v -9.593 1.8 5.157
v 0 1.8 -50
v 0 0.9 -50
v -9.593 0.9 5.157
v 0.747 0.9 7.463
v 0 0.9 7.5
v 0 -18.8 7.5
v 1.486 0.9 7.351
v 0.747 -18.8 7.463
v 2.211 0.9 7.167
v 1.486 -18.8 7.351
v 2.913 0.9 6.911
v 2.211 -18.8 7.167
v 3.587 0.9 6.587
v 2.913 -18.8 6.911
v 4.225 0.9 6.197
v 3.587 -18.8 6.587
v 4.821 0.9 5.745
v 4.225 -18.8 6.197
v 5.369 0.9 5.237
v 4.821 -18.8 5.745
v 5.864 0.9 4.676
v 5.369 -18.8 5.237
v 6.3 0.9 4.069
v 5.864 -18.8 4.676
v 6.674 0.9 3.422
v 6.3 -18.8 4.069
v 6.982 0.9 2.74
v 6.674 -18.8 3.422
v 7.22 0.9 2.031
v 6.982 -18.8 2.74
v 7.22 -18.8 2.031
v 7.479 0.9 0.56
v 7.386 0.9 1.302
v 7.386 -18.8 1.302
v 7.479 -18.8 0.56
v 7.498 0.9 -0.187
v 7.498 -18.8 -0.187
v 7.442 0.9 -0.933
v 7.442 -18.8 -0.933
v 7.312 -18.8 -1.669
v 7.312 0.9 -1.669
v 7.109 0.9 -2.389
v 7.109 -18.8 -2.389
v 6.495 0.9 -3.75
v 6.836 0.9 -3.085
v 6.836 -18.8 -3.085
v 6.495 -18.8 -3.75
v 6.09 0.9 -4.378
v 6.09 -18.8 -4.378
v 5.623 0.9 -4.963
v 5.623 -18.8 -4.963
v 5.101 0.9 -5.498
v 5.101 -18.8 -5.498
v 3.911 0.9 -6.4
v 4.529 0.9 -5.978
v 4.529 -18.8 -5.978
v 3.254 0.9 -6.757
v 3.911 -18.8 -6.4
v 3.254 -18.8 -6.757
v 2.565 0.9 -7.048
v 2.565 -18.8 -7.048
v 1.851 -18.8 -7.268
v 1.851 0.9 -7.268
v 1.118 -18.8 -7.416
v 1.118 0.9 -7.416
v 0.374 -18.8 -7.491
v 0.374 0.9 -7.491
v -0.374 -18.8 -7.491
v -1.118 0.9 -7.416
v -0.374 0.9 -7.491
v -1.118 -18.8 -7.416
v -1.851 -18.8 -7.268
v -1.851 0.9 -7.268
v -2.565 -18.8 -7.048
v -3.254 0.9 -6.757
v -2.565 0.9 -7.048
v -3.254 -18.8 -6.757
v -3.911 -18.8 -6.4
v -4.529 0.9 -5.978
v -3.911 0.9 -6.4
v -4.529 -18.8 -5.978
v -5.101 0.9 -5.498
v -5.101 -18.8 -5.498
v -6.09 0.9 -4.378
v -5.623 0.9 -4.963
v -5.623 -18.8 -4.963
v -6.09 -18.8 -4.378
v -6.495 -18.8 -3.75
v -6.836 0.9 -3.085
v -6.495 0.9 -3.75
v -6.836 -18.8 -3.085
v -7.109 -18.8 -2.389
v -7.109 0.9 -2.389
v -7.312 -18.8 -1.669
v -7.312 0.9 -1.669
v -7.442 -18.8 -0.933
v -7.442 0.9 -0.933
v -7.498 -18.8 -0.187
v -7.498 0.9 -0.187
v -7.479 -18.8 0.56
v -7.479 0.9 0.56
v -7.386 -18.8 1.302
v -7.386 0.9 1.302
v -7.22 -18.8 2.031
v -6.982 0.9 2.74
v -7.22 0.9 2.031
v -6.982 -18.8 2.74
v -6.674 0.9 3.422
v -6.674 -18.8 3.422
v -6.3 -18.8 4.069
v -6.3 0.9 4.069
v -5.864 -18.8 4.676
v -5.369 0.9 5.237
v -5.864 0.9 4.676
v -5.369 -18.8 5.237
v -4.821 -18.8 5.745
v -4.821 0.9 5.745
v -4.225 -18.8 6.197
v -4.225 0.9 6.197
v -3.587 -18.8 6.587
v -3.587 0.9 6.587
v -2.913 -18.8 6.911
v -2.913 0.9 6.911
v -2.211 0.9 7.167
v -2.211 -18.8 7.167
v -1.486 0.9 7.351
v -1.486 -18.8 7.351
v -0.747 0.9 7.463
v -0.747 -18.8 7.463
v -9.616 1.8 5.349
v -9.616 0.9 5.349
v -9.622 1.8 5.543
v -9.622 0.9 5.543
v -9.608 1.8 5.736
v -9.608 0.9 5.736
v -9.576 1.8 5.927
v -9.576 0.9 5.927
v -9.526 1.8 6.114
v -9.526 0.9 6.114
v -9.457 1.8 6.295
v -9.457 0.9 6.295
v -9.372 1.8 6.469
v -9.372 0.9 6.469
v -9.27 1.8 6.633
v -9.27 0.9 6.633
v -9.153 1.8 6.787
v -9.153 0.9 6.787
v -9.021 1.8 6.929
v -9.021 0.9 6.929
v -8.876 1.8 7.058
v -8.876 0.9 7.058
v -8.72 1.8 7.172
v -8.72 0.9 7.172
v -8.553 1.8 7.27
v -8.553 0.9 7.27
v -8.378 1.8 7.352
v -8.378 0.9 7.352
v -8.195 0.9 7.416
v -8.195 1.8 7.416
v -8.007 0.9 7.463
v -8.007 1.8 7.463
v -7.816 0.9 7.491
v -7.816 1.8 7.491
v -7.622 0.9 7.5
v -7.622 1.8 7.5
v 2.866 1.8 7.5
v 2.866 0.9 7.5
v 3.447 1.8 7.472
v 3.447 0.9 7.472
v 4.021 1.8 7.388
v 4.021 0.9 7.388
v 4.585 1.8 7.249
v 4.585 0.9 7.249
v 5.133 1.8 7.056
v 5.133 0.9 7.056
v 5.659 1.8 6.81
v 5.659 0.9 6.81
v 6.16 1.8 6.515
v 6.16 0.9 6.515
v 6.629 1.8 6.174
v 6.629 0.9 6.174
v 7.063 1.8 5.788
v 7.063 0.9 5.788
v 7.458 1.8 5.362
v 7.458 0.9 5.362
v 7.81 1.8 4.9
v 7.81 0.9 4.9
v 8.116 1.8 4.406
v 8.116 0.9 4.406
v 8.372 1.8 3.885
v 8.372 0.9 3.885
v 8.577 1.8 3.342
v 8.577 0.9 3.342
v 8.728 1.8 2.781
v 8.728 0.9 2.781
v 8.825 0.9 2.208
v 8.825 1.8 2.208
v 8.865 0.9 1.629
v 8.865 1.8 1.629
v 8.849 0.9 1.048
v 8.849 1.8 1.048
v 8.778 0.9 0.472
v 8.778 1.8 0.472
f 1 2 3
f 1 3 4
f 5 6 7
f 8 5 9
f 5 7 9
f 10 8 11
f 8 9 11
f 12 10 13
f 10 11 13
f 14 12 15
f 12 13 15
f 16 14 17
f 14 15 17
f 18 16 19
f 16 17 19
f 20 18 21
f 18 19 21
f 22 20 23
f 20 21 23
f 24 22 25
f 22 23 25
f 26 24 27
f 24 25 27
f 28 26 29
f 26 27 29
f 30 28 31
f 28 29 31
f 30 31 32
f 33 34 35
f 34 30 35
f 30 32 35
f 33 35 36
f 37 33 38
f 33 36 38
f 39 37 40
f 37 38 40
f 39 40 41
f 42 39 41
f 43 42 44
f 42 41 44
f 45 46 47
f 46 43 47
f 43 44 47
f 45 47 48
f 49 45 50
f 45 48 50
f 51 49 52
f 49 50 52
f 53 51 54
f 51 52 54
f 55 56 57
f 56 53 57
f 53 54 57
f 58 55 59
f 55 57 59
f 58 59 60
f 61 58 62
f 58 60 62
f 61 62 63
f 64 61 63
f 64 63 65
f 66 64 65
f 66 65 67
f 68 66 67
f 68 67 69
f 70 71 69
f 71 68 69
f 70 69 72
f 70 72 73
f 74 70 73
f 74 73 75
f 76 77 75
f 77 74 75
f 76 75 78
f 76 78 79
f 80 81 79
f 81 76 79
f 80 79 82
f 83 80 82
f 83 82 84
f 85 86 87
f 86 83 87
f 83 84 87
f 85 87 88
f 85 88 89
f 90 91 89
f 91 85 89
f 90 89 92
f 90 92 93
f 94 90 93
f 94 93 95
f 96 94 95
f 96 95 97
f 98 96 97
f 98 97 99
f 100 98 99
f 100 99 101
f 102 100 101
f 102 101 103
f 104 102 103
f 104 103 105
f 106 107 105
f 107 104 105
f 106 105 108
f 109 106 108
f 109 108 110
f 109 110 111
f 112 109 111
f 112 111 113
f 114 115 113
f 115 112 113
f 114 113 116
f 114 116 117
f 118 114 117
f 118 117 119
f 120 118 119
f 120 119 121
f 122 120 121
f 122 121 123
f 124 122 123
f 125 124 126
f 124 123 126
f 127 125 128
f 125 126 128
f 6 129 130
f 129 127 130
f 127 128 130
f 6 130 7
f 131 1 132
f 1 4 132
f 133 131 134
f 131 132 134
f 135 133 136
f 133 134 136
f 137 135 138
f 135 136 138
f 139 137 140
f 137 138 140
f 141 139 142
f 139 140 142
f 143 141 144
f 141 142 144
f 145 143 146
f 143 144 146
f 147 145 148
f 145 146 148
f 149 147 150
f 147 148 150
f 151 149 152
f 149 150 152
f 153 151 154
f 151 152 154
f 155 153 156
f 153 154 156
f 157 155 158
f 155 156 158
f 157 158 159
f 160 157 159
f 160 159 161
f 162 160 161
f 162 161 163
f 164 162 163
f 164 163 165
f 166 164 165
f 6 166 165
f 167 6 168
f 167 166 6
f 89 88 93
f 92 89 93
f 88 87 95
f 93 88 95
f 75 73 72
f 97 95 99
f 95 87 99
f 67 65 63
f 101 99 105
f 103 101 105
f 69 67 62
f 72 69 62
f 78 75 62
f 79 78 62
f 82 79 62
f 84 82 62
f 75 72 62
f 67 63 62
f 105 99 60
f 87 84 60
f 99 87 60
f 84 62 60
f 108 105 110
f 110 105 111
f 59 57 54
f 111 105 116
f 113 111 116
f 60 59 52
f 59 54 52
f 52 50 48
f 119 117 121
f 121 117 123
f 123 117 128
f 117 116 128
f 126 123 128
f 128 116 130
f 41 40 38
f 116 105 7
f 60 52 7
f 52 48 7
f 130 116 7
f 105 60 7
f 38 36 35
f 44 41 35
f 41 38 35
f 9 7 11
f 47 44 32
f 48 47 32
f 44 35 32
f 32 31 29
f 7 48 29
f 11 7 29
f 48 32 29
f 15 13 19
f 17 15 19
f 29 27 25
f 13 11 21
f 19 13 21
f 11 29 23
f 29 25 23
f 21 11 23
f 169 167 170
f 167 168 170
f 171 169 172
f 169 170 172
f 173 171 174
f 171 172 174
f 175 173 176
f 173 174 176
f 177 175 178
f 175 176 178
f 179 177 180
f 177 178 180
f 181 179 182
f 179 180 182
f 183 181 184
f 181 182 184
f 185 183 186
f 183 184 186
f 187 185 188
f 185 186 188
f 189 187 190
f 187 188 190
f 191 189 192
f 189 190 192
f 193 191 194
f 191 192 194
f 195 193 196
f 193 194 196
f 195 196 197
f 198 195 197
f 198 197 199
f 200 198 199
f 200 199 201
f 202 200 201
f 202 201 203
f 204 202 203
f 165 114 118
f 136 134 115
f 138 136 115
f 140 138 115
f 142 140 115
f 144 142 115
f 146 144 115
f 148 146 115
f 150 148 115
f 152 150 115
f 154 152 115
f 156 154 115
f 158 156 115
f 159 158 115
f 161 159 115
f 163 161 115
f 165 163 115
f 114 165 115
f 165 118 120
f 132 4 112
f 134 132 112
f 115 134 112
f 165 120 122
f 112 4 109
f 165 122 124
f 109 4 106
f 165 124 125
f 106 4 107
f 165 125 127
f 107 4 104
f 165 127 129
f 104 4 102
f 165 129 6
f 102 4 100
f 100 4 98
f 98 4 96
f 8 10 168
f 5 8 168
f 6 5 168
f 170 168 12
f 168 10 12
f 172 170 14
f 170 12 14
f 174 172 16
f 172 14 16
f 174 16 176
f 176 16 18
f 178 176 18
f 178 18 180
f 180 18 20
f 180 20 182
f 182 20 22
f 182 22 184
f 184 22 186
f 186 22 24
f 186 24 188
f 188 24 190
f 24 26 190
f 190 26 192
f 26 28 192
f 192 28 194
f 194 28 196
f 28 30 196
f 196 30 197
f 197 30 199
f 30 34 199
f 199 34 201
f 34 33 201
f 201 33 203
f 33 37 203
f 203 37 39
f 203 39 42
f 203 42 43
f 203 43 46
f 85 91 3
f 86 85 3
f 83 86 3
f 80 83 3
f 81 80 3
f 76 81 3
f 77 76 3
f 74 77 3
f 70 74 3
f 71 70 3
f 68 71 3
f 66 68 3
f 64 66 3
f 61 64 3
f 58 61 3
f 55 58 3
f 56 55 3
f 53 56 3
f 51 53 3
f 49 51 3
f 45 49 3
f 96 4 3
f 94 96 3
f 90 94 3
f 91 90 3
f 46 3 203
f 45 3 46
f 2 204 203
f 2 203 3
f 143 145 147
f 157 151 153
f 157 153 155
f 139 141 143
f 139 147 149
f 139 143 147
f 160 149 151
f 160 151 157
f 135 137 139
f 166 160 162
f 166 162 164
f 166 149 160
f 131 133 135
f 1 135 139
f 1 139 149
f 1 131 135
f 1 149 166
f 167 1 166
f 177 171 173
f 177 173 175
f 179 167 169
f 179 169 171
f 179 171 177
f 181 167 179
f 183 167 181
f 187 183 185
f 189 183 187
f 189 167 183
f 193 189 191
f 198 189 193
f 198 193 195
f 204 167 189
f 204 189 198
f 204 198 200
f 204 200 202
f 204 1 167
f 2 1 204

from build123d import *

# Parameters (mm, degrees)
SKETCH1_R           = 7.5
BOSS_EXTRUDE1_DEPTH = 1.8
BOSS_EXTRUDE2_START = -18.8
SKETCH1_3_R         = 7.5
BOSS_EXTRUDE2_DEPTH = 18.8
BOSS_EXTRUDE3_DEPTH = 0.9
FILLET1_R           = 6
FILLET2_R           = 2


with BuildPart() as part:
    # Sketch1 → Boss-Extrude1 (new body)
    with BuildSketch(Plane(origin=(0, 0, 0), x_dir=(1, 0, 0), z_dir=(0, 1, 0))):
        Circle(SKETCH1_R)
    extrude(amount=BOSS_EXTRUDE1_DEPTH)

    # Sketch1<3> → Boss-Extrude2 (add)
    with BuildSketch(Plane(origin=(0, 0, 0), x_dir=(1, 0, 0), z_dir=(0, 1, 0)).offset(BOSS_EXTRUDE2_START)):
        Circle(SKETCH1_3_R)
    extrude(amount=BOSS_EXTRUDE2_DEPTH)

    # Sketch3 → Boss-Extrude3 (add)
    with BuildSketch(Plane(origin=(0, 1.8, 0), x_dir=(1, 0, 0), z_dir=(0, 1, 0))):
        Polygon((0, 50), (-10, -7.5), (10, -7.5), align=None)
    extrude(amount=-BOSS_EXTRUDE3_DEPTH)

    # Fillet1
    fillet1_edges = [part.edges().sort_by_distance(p)[0] for p in [
        (10, 1.35, 7.5),
    ]]
    fillet(fillet1_edges, radius=FILLET1_R)

    # Fillet2
    fillet2_edges = [part.edges().sort_by_distance(p)[0] for p in [
        (-10, 1.35, 7.5),
    ]]
    fillet(fillet2_edges, radius=FILLET2_R)


solid = part.part
